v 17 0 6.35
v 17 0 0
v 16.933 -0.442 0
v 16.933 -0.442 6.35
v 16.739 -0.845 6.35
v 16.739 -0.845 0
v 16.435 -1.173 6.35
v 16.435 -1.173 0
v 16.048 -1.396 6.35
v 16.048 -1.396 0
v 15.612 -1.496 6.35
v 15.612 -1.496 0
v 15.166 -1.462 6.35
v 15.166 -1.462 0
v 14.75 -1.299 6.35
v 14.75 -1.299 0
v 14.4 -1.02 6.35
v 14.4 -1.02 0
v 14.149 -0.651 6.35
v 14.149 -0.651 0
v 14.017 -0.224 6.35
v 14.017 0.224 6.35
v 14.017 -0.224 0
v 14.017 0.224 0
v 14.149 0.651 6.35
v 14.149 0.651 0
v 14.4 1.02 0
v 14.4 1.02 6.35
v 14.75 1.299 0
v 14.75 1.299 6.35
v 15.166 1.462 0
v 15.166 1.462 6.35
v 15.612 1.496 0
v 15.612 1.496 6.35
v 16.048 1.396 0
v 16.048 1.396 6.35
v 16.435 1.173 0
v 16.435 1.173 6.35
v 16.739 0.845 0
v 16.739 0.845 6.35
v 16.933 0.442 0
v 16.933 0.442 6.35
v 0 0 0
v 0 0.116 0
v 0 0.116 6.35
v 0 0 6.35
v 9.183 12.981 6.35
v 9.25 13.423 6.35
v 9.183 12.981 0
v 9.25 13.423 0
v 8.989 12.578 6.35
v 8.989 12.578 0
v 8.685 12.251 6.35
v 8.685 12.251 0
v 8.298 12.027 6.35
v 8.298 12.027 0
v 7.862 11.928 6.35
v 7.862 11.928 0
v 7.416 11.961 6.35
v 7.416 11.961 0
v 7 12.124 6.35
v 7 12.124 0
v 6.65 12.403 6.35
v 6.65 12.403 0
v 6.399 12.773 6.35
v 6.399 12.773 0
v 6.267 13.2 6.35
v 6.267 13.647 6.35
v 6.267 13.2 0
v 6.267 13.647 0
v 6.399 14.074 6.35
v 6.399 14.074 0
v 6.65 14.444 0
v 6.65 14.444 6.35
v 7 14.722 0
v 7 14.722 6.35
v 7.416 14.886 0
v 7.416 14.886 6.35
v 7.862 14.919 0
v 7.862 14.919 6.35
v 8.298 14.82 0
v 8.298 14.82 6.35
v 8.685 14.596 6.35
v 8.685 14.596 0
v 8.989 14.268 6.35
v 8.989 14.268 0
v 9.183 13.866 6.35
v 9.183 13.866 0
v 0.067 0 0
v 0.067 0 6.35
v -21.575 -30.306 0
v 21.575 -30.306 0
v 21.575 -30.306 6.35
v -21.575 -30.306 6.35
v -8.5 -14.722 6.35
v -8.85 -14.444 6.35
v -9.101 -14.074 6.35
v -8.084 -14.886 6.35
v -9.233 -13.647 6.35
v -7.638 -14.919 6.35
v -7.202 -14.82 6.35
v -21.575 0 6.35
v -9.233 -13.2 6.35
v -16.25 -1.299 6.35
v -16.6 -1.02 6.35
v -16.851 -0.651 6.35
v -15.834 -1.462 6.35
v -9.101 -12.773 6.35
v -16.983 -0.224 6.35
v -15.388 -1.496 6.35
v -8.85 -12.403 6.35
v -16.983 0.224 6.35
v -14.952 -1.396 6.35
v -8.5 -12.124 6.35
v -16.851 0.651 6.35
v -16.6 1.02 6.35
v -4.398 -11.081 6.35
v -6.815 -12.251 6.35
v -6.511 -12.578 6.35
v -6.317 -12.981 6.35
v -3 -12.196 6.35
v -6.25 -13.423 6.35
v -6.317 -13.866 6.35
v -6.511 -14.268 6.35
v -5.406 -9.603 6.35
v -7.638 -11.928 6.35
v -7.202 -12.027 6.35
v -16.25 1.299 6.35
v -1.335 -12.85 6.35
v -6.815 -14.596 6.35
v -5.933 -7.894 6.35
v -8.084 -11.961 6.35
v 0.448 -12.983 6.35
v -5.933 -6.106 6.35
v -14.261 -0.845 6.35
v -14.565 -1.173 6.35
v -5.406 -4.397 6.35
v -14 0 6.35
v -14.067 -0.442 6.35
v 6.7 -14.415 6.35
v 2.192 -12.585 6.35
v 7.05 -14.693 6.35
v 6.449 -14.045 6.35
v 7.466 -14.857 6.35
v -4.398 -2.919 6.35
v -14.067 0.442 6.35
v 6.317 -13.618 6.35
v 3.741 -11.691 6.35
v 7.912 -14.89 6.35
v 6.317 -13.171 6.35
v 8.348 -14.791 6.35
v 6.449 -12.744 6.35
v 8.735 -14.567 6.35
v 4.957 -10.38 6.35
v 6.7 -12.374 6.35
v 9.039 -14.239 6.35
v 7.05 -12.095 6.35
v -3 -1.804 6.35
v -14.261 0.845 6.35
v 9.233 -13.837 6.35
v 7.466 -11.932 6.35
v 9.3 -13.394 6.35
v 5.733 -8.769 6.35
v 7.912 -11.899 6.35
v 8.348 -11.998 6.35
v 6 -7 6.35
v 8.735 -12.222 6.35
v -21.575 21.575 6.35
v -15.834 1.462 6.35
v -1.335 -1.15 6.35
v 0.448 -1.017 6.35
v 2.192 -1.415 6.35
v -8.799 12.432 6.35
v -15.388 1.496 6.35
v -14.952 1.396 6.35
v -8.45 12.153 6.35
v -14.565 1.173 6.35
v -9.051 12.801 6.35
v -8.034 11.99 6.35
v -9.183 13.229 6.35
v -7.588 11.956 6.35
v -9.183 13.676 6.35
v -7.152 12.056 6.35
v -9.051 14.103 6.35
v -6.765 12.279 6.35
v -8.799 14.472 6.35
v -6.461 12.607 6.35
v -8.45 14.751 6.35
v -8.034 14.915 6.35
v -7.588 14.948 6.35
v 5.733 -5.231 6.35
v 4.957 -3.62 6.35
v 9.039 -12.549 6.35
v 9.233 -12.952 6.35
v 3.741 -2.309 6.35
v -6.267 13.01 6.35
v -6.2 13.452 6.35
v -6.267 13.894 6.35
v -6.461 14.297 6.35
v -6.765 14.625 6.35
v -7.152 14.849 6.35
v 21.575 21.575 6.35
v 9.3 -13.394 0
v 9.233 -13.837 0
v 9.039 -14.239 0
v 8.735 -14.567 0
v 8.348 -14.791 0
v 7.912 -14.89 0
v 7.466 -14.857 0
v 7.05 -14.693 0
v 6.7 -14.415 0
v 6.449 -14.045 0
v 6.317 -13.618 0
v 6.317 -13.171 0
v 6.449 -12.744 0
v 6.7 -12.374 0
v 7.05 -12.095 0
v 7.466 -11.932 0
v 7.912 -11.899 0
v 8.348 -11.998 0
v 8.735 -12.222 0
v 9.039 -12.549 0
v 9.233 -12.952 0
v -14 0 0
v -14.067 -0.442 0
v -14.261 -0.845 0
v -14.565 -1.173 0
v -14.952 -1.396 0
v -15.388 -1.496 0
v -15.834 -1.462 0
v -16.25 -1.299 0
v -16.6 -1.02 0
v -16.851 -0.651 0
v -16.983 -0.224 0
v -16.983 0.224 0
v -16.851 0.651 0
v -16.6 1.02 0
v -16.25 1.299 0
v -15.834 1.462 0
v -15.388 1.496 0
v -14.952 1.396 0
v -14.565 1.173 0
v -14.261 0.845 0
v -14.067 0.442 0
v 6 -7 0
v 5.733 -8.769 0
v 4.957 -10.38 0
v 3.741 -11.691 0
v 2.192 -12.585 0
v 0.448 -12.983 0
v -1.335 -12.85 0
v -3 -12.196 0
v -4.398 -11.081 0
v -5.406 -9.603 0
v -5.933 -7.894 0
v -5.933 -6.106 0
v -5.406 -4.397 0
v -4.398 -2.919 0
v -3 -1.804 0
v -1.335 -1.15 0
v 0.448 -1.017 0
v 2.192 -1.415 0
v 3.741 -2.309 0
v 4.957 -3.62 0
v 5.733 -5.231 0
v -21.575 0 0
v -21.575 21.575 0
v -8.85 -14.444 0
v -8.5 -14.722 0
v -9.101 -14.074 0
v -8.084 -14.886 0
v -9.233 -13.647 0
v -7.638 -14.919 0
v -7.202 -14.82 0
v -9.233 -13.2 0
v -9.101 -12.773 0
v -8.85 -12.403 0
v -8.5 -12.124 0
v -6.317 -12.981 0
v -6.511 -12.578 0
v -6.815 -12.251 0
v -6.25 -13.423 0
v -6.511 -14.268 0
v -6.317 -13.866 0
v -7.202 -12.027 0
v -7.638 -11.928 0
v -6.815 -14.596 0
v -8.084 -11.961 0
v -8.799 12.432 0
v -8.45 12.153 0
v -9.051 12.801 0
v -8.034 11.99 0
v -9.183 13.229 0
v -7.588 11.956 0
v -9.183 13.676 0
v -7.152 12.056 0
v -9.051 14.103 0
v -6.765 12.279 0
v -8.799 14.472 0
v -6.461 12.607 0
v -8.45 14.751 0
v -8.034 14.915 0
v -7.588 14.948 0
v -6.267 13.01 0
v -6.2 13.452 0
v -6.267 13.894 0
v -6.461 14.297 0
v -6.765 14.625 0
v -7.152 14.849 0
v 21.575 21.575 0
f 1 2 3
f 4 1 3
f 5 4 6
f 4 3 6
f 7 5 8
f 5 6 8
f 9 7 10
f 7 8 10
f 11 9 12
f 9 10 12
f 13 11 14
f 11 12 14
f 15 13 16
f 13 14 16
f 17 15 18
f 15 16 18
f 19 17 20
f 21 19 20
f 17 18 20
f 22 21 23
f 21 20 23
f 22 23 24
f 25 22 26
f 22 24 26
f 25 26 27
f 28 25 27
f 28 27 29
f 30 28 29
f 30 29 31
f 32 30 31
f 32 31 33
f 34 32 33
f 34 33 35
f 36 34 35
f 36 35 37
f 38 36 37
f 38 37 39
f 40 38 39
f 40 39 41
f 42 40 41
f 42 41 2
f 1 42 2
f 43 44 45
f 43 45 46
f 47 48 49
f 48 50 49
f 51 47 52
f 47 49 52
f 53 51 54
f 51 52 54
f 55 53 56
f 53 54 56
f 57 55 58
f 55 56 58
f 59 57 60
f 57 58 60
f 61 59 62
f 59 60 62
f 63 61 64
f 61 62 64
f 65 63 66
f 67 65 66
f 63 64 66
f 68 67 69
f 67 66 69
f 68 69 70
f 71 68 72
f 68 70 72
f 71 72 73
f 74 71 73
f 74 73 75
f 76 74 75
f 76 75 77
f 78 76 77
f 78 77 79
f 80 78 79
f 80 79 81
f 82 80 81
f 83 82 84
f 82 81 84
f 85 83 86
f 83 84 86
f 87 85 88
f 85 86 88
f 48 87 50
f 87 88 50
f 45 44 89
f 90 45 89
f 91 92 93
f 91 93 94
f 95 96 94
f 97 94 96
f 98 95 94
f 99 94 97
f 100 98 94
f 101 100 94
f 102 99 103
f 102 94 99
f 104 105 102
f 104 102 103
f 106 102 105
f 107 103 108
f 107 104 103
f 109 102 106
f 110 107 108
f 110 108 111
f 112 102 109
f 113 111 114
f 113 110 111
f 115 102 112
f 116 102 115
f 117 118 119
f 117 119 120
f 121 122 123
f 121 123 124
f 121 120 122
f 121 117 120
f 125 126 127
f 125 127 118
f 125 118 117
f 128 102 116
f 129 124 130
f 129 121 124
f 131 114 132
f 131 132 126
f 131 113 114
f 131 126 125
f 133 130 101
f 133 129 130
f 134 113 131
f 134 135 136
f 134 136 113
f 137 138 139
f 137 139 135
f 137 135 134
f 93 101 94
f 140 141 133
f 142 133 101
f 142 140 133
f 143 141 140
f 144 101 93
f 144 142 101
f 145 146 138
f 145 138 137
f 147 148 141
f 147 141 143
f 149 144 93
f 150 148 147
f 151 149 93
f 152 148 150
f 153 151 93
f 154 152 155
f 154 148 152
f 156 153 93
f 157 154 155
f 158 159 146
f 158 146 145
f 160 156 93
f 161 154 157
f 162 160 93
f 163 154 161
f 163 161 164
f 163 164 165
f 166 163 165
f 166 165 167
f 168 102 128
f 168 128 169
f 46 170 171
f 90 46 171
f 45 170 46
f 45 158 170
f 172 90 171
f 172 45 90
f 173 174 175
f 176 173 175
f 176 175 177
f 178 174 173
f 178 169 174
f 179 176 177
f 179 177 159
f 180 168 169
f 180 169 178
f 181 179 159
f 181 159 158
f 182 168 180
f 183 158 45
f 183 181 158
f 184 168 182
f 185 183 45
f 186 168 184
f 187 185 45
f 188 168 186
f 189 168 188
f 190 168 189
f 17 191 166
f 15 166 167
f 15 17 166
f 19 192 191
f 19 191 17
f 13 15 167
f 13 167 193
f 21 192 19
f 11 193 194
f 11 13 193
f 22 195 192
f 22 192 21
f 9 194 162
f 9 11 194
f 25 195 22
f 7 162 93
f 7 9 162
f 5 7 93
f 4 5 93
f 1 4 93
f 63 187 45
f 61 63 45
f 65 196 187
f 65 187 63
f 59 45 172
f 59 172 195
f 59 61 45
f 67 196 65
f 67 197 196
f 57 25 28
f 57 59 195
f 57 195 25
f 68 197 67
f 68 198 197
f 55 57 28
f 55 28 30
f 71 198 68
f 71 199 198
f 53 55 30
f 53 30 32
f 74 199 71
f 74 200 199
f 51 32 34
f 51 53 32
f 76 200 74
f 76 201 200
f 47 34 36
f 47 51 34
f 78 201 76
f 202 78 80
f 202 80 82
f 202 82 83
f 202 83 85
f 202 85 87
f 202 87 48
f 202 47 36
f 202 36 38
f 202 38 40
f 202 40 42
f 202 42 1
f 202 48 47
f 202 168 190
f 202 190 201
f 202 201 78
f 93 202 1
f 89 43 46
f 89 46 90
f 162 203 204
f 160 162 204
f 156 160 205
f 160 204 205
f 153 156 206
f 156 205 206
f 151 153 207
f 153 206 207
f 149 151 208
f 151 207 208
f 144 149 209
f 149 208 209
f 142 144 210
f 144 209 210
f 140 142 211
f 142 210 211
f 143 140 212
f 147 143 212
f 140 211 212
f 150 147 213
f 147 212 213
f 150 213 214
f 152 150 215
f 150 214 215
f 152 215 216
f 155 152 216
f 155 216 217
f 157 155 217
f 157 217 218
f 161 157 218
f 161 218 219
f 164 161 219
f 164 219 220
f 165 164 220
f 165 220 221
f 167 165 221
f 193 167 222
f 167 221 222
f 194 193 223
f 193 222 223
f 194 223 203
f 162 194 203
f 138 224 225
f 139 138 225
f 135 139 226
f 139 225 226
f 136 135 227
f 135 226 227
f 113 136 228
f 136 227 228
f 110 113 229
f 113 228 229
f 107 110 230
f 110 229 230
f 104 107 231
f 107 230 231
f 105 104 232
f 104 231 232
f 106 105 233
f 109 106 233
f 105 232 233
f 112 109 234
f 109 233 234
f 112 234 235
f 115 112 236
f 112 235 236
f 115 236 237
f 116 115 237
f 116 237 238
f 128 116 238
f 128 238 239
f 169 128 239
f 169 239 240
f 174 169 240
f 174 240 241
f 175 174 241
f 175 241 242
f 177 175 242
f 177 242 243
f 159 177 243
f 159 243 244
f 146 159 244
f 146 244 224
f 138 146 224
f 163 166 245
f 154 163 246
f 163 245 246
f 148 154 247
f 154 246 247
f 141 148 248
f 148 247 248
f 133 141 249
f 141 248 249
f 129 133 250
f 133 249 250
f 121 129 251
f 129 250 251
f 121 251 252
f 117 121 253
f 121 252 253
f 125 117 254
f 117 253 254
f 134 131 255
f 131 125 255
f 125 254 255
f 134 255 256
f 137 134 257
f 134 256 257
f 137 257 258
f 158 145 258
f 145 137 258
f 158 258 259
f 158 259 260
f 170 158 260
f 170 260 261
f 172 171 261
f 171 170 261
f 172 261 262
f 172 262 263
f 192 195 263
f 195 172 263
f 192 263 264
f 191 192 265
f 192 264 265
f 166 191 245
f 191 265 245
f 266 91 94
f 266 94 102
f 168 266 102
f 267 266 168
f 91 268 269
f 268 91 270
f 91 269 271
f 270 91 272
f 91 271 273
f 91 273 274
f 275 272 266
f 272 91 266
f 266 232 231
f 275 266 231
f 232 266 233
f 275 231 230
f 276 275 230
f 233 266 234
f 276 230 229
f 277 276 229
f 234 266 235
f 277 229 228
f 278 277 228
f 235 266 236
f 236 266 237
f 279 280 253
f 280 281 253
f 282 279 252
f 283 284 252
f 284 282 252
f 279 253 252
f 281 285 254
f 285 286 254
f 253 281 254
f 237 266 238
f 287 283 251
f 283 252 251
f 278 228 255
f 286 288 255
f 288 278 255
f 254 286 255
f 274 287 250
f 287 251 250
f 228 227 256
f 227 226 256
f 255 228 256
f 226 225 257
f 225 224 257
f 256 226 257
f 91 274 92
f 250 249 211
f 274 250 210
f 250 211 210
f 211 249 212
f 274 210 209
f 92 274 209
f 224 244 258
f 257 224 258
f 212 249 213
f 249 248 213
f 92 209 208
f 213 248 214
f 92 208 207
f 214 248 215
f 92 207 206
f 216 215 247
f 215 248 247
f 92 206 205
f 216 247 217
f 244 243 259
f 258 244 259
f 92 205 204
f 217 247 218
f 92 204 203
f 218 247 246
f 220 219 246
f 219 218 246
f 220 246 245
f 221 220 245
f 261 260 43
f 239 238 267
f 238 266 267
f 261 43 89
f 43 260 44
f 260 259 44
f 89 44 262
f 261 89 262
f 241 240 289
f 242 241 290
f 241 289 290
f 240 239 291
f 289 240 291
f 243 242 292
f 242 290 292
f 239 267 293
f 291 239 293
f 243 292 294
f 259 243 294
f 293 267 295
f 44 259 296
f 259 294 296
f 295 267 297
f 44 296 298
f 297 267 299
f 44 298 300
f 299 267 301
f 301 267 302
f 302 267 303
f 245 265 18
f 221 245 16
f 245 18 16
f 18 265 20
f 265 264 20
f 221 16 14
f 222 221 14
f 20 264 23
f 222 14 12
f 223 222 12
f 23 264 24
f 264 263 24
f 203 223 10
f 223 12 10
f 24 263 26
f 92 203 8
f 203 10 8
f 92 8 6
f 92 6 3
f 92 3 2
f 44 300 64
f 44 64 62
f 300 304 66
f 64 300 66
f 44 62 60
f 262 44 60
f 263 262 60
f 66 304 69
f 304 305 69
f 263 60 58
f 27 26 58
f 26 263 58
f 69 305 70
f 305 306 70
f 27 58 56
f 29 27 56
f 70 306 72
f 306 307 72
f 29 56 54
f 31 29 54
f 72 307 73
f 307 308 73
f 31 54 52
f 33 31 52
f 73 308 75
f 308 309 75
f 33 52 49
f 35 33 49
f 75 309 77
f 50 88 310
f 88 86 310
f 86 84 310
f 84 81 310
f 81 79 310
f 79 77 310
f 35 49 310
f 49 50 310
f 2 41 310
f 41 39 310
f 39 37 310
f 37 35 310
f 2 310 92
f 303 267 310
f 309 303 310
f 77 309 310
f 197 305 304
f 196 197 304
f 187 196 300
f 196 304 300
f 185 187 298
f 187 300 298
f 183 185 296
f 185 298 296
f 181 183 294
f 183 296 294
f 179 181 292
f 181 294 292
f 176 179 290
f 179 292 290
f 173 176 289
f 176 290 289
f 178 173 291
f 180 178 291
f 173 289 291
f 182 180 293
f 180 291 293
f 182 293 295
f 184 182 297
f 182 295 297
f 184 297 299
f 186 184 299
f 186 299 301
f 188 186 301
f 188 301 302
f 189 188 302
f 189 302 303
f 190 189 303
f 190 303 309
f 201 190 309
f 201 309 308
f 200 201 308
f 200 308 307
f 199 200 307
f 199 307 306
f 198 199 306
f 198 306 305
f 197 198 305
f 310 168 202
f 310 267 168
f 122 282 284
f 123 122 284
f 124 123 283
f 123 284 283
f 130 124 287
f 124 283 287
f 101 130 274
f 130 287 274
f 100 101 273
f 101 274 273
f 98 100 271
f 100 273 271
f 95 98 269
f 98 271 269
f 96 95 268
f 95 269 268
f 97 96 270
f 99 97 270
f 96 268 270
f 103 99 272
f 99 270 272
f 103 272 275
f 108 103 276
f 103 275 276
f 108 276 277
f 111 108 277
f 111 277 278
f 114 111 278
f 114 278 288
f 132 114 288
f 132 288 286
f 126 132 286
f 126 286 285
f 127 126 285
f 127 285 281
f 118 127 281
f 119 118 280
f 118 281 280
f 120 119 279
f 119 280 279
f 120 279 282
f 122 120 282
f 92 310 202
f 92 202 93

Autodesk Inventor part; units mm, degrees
ref_plane "YZ Plane" through (0, 0, 0) normal (1, 0, 0) x (0, 1, 0)
ref_plane "XZ Plane" through (0, 0, 0) normal (0, 1, 0) x (-1, 0, 0)
ref_plane "XY Plane" through (0, 0, 0) normal (0, 0, 1) x (1, 0, 0)
sketch "Sketch1" plane through (0, 0, 0) normal (0, 0, 1) x (1, 0, 0)
  point P0 (0, 0)
ref_plane "Work Plane1" through (0, 0, 0) normal (0, 0, 1) x (1, 0, 0)
sketch "Sketch5" plane through (0, 0, 0) normal (0, 0, 1) x (1, 0, 0)
  circle A0 centre (-15.5, 0) radius 1.5
  circle A1 centre (0, 0) radius 18.4 projected
  line L0 (-18.4, 0) -> (18.4, 0)
  line L1 (-1.5961, -18.3306) -> (-1.5961, -18.3306)
  line L2 (0, 18.4) -> (0, -18.4)
  circle A2 centre (0, -7) radius 6
  circle A3 centre (15.5, 0) radius 1.5
  circle A4 centre (0, 0) radius 15.5
  line L3 (-11.863, 20.6629) -> (9.25, -15.9059)
  circle A5 centre (0, 0) radius 18.4 projected
  line L4 (-9.2, -15.9349) -> (9.2, 15.9349)
  circle A6 centre (7.8, -13.3944) radius 1.5
  circle A7 centre (7.75, 13.4234) radius 1.5
  circle A8 centre (-7.75, -13.4234) radius 1.5
  circle A9 centre (-7.6999, 13.4522) radius 1.5
  line L5 (0, 0) -> (-21.575, 0)
  line L6 (-21.575, 0) -> (-21.575, 21.575)
  line L7 (-21.575, 21.575) -> (21.575, 21.575)
  line L8 (21.575, 21.575) -> (21.575, -30.3062)
  line L9 (21.575, -30.3062) -> (-21.575, -30.3062)
  line L10 (-21.575, -30.3062) -> (-21.575, 21.575)
  point P0 (7.75, 13.4234)
  point P1 (7.8, -13.3944)
  point P2 (-0.5944, -1.0295)
  point P3 (0, 0.1156)
  point P4 (0.6654, -1.037)
  point P5 (0.0667, 0)
  dimension "d10" = 3
  dimension "d11" = 12
  dimension "d12" = 7
  dimension "d15" = 3
  dimension "d16" = 31
  dimension "d17" = 2.9
  dimension "d19" = 60
  dimension "d20" = 60
  dimension "d21" = 3
  dimension "d22" = 3
  dimension "d23" = 3
  dimension "d24" = 3
  dimension "d33" = 21.575
  dimension "d34" = 43.15
  dimension "d35" = 30.3062
  dimension "d36" = 21.575
extrude "Extrusion8" add sketch "Sketch5" along normal blind 6.35 contours L0 L4 A2 A8 A4 A0 | A0 A4 A9 L3 L2 L0 | A0 L0 A1 L3 A9 A4 | A4 A8 L4 A1 L0 A0 | L0 L3 A2 L2 | L2 A2 L4 | L3 L4 A7 A4 A3 L0 | L0 A3 A4 A6 L3 A2 | L3 A9 A4 L2 | L2 A4 A7 L4 L3 | L6 L7 L8 L9 L10 | L3 A1 L2 A4 A9 | L4 A2 L2 A4 A8 | A8 A4 L2 A1 L4 | L2 A1 L4 A7 A4 | A2 L3 A6 A4 L2 | A4 A7 L4 A1 L0 A3 | A3 L0 A1 L3 A6 A4 | A4 A6 L3 A1 L2 picked at (-0.0661, -0.6678)
equation "\"d33\" = MountOffset"
equation "\"d34\" = 2 * MountOffset"
equation "\"d35\" = longMountLength"
equation "\"d36\" = shortMountLength"
equation "\"d37\" = mountDepth"
equation "\"motorDiameter\" = 36.8"
equation "\"mountDepth\" = 6.35"
equation "\"MountOffset\" = 21.575"
equation "\"longMountLength\" = 30.30625"
equation "\"shortMountLength\" = 21.575"
properties part number "Motor"
